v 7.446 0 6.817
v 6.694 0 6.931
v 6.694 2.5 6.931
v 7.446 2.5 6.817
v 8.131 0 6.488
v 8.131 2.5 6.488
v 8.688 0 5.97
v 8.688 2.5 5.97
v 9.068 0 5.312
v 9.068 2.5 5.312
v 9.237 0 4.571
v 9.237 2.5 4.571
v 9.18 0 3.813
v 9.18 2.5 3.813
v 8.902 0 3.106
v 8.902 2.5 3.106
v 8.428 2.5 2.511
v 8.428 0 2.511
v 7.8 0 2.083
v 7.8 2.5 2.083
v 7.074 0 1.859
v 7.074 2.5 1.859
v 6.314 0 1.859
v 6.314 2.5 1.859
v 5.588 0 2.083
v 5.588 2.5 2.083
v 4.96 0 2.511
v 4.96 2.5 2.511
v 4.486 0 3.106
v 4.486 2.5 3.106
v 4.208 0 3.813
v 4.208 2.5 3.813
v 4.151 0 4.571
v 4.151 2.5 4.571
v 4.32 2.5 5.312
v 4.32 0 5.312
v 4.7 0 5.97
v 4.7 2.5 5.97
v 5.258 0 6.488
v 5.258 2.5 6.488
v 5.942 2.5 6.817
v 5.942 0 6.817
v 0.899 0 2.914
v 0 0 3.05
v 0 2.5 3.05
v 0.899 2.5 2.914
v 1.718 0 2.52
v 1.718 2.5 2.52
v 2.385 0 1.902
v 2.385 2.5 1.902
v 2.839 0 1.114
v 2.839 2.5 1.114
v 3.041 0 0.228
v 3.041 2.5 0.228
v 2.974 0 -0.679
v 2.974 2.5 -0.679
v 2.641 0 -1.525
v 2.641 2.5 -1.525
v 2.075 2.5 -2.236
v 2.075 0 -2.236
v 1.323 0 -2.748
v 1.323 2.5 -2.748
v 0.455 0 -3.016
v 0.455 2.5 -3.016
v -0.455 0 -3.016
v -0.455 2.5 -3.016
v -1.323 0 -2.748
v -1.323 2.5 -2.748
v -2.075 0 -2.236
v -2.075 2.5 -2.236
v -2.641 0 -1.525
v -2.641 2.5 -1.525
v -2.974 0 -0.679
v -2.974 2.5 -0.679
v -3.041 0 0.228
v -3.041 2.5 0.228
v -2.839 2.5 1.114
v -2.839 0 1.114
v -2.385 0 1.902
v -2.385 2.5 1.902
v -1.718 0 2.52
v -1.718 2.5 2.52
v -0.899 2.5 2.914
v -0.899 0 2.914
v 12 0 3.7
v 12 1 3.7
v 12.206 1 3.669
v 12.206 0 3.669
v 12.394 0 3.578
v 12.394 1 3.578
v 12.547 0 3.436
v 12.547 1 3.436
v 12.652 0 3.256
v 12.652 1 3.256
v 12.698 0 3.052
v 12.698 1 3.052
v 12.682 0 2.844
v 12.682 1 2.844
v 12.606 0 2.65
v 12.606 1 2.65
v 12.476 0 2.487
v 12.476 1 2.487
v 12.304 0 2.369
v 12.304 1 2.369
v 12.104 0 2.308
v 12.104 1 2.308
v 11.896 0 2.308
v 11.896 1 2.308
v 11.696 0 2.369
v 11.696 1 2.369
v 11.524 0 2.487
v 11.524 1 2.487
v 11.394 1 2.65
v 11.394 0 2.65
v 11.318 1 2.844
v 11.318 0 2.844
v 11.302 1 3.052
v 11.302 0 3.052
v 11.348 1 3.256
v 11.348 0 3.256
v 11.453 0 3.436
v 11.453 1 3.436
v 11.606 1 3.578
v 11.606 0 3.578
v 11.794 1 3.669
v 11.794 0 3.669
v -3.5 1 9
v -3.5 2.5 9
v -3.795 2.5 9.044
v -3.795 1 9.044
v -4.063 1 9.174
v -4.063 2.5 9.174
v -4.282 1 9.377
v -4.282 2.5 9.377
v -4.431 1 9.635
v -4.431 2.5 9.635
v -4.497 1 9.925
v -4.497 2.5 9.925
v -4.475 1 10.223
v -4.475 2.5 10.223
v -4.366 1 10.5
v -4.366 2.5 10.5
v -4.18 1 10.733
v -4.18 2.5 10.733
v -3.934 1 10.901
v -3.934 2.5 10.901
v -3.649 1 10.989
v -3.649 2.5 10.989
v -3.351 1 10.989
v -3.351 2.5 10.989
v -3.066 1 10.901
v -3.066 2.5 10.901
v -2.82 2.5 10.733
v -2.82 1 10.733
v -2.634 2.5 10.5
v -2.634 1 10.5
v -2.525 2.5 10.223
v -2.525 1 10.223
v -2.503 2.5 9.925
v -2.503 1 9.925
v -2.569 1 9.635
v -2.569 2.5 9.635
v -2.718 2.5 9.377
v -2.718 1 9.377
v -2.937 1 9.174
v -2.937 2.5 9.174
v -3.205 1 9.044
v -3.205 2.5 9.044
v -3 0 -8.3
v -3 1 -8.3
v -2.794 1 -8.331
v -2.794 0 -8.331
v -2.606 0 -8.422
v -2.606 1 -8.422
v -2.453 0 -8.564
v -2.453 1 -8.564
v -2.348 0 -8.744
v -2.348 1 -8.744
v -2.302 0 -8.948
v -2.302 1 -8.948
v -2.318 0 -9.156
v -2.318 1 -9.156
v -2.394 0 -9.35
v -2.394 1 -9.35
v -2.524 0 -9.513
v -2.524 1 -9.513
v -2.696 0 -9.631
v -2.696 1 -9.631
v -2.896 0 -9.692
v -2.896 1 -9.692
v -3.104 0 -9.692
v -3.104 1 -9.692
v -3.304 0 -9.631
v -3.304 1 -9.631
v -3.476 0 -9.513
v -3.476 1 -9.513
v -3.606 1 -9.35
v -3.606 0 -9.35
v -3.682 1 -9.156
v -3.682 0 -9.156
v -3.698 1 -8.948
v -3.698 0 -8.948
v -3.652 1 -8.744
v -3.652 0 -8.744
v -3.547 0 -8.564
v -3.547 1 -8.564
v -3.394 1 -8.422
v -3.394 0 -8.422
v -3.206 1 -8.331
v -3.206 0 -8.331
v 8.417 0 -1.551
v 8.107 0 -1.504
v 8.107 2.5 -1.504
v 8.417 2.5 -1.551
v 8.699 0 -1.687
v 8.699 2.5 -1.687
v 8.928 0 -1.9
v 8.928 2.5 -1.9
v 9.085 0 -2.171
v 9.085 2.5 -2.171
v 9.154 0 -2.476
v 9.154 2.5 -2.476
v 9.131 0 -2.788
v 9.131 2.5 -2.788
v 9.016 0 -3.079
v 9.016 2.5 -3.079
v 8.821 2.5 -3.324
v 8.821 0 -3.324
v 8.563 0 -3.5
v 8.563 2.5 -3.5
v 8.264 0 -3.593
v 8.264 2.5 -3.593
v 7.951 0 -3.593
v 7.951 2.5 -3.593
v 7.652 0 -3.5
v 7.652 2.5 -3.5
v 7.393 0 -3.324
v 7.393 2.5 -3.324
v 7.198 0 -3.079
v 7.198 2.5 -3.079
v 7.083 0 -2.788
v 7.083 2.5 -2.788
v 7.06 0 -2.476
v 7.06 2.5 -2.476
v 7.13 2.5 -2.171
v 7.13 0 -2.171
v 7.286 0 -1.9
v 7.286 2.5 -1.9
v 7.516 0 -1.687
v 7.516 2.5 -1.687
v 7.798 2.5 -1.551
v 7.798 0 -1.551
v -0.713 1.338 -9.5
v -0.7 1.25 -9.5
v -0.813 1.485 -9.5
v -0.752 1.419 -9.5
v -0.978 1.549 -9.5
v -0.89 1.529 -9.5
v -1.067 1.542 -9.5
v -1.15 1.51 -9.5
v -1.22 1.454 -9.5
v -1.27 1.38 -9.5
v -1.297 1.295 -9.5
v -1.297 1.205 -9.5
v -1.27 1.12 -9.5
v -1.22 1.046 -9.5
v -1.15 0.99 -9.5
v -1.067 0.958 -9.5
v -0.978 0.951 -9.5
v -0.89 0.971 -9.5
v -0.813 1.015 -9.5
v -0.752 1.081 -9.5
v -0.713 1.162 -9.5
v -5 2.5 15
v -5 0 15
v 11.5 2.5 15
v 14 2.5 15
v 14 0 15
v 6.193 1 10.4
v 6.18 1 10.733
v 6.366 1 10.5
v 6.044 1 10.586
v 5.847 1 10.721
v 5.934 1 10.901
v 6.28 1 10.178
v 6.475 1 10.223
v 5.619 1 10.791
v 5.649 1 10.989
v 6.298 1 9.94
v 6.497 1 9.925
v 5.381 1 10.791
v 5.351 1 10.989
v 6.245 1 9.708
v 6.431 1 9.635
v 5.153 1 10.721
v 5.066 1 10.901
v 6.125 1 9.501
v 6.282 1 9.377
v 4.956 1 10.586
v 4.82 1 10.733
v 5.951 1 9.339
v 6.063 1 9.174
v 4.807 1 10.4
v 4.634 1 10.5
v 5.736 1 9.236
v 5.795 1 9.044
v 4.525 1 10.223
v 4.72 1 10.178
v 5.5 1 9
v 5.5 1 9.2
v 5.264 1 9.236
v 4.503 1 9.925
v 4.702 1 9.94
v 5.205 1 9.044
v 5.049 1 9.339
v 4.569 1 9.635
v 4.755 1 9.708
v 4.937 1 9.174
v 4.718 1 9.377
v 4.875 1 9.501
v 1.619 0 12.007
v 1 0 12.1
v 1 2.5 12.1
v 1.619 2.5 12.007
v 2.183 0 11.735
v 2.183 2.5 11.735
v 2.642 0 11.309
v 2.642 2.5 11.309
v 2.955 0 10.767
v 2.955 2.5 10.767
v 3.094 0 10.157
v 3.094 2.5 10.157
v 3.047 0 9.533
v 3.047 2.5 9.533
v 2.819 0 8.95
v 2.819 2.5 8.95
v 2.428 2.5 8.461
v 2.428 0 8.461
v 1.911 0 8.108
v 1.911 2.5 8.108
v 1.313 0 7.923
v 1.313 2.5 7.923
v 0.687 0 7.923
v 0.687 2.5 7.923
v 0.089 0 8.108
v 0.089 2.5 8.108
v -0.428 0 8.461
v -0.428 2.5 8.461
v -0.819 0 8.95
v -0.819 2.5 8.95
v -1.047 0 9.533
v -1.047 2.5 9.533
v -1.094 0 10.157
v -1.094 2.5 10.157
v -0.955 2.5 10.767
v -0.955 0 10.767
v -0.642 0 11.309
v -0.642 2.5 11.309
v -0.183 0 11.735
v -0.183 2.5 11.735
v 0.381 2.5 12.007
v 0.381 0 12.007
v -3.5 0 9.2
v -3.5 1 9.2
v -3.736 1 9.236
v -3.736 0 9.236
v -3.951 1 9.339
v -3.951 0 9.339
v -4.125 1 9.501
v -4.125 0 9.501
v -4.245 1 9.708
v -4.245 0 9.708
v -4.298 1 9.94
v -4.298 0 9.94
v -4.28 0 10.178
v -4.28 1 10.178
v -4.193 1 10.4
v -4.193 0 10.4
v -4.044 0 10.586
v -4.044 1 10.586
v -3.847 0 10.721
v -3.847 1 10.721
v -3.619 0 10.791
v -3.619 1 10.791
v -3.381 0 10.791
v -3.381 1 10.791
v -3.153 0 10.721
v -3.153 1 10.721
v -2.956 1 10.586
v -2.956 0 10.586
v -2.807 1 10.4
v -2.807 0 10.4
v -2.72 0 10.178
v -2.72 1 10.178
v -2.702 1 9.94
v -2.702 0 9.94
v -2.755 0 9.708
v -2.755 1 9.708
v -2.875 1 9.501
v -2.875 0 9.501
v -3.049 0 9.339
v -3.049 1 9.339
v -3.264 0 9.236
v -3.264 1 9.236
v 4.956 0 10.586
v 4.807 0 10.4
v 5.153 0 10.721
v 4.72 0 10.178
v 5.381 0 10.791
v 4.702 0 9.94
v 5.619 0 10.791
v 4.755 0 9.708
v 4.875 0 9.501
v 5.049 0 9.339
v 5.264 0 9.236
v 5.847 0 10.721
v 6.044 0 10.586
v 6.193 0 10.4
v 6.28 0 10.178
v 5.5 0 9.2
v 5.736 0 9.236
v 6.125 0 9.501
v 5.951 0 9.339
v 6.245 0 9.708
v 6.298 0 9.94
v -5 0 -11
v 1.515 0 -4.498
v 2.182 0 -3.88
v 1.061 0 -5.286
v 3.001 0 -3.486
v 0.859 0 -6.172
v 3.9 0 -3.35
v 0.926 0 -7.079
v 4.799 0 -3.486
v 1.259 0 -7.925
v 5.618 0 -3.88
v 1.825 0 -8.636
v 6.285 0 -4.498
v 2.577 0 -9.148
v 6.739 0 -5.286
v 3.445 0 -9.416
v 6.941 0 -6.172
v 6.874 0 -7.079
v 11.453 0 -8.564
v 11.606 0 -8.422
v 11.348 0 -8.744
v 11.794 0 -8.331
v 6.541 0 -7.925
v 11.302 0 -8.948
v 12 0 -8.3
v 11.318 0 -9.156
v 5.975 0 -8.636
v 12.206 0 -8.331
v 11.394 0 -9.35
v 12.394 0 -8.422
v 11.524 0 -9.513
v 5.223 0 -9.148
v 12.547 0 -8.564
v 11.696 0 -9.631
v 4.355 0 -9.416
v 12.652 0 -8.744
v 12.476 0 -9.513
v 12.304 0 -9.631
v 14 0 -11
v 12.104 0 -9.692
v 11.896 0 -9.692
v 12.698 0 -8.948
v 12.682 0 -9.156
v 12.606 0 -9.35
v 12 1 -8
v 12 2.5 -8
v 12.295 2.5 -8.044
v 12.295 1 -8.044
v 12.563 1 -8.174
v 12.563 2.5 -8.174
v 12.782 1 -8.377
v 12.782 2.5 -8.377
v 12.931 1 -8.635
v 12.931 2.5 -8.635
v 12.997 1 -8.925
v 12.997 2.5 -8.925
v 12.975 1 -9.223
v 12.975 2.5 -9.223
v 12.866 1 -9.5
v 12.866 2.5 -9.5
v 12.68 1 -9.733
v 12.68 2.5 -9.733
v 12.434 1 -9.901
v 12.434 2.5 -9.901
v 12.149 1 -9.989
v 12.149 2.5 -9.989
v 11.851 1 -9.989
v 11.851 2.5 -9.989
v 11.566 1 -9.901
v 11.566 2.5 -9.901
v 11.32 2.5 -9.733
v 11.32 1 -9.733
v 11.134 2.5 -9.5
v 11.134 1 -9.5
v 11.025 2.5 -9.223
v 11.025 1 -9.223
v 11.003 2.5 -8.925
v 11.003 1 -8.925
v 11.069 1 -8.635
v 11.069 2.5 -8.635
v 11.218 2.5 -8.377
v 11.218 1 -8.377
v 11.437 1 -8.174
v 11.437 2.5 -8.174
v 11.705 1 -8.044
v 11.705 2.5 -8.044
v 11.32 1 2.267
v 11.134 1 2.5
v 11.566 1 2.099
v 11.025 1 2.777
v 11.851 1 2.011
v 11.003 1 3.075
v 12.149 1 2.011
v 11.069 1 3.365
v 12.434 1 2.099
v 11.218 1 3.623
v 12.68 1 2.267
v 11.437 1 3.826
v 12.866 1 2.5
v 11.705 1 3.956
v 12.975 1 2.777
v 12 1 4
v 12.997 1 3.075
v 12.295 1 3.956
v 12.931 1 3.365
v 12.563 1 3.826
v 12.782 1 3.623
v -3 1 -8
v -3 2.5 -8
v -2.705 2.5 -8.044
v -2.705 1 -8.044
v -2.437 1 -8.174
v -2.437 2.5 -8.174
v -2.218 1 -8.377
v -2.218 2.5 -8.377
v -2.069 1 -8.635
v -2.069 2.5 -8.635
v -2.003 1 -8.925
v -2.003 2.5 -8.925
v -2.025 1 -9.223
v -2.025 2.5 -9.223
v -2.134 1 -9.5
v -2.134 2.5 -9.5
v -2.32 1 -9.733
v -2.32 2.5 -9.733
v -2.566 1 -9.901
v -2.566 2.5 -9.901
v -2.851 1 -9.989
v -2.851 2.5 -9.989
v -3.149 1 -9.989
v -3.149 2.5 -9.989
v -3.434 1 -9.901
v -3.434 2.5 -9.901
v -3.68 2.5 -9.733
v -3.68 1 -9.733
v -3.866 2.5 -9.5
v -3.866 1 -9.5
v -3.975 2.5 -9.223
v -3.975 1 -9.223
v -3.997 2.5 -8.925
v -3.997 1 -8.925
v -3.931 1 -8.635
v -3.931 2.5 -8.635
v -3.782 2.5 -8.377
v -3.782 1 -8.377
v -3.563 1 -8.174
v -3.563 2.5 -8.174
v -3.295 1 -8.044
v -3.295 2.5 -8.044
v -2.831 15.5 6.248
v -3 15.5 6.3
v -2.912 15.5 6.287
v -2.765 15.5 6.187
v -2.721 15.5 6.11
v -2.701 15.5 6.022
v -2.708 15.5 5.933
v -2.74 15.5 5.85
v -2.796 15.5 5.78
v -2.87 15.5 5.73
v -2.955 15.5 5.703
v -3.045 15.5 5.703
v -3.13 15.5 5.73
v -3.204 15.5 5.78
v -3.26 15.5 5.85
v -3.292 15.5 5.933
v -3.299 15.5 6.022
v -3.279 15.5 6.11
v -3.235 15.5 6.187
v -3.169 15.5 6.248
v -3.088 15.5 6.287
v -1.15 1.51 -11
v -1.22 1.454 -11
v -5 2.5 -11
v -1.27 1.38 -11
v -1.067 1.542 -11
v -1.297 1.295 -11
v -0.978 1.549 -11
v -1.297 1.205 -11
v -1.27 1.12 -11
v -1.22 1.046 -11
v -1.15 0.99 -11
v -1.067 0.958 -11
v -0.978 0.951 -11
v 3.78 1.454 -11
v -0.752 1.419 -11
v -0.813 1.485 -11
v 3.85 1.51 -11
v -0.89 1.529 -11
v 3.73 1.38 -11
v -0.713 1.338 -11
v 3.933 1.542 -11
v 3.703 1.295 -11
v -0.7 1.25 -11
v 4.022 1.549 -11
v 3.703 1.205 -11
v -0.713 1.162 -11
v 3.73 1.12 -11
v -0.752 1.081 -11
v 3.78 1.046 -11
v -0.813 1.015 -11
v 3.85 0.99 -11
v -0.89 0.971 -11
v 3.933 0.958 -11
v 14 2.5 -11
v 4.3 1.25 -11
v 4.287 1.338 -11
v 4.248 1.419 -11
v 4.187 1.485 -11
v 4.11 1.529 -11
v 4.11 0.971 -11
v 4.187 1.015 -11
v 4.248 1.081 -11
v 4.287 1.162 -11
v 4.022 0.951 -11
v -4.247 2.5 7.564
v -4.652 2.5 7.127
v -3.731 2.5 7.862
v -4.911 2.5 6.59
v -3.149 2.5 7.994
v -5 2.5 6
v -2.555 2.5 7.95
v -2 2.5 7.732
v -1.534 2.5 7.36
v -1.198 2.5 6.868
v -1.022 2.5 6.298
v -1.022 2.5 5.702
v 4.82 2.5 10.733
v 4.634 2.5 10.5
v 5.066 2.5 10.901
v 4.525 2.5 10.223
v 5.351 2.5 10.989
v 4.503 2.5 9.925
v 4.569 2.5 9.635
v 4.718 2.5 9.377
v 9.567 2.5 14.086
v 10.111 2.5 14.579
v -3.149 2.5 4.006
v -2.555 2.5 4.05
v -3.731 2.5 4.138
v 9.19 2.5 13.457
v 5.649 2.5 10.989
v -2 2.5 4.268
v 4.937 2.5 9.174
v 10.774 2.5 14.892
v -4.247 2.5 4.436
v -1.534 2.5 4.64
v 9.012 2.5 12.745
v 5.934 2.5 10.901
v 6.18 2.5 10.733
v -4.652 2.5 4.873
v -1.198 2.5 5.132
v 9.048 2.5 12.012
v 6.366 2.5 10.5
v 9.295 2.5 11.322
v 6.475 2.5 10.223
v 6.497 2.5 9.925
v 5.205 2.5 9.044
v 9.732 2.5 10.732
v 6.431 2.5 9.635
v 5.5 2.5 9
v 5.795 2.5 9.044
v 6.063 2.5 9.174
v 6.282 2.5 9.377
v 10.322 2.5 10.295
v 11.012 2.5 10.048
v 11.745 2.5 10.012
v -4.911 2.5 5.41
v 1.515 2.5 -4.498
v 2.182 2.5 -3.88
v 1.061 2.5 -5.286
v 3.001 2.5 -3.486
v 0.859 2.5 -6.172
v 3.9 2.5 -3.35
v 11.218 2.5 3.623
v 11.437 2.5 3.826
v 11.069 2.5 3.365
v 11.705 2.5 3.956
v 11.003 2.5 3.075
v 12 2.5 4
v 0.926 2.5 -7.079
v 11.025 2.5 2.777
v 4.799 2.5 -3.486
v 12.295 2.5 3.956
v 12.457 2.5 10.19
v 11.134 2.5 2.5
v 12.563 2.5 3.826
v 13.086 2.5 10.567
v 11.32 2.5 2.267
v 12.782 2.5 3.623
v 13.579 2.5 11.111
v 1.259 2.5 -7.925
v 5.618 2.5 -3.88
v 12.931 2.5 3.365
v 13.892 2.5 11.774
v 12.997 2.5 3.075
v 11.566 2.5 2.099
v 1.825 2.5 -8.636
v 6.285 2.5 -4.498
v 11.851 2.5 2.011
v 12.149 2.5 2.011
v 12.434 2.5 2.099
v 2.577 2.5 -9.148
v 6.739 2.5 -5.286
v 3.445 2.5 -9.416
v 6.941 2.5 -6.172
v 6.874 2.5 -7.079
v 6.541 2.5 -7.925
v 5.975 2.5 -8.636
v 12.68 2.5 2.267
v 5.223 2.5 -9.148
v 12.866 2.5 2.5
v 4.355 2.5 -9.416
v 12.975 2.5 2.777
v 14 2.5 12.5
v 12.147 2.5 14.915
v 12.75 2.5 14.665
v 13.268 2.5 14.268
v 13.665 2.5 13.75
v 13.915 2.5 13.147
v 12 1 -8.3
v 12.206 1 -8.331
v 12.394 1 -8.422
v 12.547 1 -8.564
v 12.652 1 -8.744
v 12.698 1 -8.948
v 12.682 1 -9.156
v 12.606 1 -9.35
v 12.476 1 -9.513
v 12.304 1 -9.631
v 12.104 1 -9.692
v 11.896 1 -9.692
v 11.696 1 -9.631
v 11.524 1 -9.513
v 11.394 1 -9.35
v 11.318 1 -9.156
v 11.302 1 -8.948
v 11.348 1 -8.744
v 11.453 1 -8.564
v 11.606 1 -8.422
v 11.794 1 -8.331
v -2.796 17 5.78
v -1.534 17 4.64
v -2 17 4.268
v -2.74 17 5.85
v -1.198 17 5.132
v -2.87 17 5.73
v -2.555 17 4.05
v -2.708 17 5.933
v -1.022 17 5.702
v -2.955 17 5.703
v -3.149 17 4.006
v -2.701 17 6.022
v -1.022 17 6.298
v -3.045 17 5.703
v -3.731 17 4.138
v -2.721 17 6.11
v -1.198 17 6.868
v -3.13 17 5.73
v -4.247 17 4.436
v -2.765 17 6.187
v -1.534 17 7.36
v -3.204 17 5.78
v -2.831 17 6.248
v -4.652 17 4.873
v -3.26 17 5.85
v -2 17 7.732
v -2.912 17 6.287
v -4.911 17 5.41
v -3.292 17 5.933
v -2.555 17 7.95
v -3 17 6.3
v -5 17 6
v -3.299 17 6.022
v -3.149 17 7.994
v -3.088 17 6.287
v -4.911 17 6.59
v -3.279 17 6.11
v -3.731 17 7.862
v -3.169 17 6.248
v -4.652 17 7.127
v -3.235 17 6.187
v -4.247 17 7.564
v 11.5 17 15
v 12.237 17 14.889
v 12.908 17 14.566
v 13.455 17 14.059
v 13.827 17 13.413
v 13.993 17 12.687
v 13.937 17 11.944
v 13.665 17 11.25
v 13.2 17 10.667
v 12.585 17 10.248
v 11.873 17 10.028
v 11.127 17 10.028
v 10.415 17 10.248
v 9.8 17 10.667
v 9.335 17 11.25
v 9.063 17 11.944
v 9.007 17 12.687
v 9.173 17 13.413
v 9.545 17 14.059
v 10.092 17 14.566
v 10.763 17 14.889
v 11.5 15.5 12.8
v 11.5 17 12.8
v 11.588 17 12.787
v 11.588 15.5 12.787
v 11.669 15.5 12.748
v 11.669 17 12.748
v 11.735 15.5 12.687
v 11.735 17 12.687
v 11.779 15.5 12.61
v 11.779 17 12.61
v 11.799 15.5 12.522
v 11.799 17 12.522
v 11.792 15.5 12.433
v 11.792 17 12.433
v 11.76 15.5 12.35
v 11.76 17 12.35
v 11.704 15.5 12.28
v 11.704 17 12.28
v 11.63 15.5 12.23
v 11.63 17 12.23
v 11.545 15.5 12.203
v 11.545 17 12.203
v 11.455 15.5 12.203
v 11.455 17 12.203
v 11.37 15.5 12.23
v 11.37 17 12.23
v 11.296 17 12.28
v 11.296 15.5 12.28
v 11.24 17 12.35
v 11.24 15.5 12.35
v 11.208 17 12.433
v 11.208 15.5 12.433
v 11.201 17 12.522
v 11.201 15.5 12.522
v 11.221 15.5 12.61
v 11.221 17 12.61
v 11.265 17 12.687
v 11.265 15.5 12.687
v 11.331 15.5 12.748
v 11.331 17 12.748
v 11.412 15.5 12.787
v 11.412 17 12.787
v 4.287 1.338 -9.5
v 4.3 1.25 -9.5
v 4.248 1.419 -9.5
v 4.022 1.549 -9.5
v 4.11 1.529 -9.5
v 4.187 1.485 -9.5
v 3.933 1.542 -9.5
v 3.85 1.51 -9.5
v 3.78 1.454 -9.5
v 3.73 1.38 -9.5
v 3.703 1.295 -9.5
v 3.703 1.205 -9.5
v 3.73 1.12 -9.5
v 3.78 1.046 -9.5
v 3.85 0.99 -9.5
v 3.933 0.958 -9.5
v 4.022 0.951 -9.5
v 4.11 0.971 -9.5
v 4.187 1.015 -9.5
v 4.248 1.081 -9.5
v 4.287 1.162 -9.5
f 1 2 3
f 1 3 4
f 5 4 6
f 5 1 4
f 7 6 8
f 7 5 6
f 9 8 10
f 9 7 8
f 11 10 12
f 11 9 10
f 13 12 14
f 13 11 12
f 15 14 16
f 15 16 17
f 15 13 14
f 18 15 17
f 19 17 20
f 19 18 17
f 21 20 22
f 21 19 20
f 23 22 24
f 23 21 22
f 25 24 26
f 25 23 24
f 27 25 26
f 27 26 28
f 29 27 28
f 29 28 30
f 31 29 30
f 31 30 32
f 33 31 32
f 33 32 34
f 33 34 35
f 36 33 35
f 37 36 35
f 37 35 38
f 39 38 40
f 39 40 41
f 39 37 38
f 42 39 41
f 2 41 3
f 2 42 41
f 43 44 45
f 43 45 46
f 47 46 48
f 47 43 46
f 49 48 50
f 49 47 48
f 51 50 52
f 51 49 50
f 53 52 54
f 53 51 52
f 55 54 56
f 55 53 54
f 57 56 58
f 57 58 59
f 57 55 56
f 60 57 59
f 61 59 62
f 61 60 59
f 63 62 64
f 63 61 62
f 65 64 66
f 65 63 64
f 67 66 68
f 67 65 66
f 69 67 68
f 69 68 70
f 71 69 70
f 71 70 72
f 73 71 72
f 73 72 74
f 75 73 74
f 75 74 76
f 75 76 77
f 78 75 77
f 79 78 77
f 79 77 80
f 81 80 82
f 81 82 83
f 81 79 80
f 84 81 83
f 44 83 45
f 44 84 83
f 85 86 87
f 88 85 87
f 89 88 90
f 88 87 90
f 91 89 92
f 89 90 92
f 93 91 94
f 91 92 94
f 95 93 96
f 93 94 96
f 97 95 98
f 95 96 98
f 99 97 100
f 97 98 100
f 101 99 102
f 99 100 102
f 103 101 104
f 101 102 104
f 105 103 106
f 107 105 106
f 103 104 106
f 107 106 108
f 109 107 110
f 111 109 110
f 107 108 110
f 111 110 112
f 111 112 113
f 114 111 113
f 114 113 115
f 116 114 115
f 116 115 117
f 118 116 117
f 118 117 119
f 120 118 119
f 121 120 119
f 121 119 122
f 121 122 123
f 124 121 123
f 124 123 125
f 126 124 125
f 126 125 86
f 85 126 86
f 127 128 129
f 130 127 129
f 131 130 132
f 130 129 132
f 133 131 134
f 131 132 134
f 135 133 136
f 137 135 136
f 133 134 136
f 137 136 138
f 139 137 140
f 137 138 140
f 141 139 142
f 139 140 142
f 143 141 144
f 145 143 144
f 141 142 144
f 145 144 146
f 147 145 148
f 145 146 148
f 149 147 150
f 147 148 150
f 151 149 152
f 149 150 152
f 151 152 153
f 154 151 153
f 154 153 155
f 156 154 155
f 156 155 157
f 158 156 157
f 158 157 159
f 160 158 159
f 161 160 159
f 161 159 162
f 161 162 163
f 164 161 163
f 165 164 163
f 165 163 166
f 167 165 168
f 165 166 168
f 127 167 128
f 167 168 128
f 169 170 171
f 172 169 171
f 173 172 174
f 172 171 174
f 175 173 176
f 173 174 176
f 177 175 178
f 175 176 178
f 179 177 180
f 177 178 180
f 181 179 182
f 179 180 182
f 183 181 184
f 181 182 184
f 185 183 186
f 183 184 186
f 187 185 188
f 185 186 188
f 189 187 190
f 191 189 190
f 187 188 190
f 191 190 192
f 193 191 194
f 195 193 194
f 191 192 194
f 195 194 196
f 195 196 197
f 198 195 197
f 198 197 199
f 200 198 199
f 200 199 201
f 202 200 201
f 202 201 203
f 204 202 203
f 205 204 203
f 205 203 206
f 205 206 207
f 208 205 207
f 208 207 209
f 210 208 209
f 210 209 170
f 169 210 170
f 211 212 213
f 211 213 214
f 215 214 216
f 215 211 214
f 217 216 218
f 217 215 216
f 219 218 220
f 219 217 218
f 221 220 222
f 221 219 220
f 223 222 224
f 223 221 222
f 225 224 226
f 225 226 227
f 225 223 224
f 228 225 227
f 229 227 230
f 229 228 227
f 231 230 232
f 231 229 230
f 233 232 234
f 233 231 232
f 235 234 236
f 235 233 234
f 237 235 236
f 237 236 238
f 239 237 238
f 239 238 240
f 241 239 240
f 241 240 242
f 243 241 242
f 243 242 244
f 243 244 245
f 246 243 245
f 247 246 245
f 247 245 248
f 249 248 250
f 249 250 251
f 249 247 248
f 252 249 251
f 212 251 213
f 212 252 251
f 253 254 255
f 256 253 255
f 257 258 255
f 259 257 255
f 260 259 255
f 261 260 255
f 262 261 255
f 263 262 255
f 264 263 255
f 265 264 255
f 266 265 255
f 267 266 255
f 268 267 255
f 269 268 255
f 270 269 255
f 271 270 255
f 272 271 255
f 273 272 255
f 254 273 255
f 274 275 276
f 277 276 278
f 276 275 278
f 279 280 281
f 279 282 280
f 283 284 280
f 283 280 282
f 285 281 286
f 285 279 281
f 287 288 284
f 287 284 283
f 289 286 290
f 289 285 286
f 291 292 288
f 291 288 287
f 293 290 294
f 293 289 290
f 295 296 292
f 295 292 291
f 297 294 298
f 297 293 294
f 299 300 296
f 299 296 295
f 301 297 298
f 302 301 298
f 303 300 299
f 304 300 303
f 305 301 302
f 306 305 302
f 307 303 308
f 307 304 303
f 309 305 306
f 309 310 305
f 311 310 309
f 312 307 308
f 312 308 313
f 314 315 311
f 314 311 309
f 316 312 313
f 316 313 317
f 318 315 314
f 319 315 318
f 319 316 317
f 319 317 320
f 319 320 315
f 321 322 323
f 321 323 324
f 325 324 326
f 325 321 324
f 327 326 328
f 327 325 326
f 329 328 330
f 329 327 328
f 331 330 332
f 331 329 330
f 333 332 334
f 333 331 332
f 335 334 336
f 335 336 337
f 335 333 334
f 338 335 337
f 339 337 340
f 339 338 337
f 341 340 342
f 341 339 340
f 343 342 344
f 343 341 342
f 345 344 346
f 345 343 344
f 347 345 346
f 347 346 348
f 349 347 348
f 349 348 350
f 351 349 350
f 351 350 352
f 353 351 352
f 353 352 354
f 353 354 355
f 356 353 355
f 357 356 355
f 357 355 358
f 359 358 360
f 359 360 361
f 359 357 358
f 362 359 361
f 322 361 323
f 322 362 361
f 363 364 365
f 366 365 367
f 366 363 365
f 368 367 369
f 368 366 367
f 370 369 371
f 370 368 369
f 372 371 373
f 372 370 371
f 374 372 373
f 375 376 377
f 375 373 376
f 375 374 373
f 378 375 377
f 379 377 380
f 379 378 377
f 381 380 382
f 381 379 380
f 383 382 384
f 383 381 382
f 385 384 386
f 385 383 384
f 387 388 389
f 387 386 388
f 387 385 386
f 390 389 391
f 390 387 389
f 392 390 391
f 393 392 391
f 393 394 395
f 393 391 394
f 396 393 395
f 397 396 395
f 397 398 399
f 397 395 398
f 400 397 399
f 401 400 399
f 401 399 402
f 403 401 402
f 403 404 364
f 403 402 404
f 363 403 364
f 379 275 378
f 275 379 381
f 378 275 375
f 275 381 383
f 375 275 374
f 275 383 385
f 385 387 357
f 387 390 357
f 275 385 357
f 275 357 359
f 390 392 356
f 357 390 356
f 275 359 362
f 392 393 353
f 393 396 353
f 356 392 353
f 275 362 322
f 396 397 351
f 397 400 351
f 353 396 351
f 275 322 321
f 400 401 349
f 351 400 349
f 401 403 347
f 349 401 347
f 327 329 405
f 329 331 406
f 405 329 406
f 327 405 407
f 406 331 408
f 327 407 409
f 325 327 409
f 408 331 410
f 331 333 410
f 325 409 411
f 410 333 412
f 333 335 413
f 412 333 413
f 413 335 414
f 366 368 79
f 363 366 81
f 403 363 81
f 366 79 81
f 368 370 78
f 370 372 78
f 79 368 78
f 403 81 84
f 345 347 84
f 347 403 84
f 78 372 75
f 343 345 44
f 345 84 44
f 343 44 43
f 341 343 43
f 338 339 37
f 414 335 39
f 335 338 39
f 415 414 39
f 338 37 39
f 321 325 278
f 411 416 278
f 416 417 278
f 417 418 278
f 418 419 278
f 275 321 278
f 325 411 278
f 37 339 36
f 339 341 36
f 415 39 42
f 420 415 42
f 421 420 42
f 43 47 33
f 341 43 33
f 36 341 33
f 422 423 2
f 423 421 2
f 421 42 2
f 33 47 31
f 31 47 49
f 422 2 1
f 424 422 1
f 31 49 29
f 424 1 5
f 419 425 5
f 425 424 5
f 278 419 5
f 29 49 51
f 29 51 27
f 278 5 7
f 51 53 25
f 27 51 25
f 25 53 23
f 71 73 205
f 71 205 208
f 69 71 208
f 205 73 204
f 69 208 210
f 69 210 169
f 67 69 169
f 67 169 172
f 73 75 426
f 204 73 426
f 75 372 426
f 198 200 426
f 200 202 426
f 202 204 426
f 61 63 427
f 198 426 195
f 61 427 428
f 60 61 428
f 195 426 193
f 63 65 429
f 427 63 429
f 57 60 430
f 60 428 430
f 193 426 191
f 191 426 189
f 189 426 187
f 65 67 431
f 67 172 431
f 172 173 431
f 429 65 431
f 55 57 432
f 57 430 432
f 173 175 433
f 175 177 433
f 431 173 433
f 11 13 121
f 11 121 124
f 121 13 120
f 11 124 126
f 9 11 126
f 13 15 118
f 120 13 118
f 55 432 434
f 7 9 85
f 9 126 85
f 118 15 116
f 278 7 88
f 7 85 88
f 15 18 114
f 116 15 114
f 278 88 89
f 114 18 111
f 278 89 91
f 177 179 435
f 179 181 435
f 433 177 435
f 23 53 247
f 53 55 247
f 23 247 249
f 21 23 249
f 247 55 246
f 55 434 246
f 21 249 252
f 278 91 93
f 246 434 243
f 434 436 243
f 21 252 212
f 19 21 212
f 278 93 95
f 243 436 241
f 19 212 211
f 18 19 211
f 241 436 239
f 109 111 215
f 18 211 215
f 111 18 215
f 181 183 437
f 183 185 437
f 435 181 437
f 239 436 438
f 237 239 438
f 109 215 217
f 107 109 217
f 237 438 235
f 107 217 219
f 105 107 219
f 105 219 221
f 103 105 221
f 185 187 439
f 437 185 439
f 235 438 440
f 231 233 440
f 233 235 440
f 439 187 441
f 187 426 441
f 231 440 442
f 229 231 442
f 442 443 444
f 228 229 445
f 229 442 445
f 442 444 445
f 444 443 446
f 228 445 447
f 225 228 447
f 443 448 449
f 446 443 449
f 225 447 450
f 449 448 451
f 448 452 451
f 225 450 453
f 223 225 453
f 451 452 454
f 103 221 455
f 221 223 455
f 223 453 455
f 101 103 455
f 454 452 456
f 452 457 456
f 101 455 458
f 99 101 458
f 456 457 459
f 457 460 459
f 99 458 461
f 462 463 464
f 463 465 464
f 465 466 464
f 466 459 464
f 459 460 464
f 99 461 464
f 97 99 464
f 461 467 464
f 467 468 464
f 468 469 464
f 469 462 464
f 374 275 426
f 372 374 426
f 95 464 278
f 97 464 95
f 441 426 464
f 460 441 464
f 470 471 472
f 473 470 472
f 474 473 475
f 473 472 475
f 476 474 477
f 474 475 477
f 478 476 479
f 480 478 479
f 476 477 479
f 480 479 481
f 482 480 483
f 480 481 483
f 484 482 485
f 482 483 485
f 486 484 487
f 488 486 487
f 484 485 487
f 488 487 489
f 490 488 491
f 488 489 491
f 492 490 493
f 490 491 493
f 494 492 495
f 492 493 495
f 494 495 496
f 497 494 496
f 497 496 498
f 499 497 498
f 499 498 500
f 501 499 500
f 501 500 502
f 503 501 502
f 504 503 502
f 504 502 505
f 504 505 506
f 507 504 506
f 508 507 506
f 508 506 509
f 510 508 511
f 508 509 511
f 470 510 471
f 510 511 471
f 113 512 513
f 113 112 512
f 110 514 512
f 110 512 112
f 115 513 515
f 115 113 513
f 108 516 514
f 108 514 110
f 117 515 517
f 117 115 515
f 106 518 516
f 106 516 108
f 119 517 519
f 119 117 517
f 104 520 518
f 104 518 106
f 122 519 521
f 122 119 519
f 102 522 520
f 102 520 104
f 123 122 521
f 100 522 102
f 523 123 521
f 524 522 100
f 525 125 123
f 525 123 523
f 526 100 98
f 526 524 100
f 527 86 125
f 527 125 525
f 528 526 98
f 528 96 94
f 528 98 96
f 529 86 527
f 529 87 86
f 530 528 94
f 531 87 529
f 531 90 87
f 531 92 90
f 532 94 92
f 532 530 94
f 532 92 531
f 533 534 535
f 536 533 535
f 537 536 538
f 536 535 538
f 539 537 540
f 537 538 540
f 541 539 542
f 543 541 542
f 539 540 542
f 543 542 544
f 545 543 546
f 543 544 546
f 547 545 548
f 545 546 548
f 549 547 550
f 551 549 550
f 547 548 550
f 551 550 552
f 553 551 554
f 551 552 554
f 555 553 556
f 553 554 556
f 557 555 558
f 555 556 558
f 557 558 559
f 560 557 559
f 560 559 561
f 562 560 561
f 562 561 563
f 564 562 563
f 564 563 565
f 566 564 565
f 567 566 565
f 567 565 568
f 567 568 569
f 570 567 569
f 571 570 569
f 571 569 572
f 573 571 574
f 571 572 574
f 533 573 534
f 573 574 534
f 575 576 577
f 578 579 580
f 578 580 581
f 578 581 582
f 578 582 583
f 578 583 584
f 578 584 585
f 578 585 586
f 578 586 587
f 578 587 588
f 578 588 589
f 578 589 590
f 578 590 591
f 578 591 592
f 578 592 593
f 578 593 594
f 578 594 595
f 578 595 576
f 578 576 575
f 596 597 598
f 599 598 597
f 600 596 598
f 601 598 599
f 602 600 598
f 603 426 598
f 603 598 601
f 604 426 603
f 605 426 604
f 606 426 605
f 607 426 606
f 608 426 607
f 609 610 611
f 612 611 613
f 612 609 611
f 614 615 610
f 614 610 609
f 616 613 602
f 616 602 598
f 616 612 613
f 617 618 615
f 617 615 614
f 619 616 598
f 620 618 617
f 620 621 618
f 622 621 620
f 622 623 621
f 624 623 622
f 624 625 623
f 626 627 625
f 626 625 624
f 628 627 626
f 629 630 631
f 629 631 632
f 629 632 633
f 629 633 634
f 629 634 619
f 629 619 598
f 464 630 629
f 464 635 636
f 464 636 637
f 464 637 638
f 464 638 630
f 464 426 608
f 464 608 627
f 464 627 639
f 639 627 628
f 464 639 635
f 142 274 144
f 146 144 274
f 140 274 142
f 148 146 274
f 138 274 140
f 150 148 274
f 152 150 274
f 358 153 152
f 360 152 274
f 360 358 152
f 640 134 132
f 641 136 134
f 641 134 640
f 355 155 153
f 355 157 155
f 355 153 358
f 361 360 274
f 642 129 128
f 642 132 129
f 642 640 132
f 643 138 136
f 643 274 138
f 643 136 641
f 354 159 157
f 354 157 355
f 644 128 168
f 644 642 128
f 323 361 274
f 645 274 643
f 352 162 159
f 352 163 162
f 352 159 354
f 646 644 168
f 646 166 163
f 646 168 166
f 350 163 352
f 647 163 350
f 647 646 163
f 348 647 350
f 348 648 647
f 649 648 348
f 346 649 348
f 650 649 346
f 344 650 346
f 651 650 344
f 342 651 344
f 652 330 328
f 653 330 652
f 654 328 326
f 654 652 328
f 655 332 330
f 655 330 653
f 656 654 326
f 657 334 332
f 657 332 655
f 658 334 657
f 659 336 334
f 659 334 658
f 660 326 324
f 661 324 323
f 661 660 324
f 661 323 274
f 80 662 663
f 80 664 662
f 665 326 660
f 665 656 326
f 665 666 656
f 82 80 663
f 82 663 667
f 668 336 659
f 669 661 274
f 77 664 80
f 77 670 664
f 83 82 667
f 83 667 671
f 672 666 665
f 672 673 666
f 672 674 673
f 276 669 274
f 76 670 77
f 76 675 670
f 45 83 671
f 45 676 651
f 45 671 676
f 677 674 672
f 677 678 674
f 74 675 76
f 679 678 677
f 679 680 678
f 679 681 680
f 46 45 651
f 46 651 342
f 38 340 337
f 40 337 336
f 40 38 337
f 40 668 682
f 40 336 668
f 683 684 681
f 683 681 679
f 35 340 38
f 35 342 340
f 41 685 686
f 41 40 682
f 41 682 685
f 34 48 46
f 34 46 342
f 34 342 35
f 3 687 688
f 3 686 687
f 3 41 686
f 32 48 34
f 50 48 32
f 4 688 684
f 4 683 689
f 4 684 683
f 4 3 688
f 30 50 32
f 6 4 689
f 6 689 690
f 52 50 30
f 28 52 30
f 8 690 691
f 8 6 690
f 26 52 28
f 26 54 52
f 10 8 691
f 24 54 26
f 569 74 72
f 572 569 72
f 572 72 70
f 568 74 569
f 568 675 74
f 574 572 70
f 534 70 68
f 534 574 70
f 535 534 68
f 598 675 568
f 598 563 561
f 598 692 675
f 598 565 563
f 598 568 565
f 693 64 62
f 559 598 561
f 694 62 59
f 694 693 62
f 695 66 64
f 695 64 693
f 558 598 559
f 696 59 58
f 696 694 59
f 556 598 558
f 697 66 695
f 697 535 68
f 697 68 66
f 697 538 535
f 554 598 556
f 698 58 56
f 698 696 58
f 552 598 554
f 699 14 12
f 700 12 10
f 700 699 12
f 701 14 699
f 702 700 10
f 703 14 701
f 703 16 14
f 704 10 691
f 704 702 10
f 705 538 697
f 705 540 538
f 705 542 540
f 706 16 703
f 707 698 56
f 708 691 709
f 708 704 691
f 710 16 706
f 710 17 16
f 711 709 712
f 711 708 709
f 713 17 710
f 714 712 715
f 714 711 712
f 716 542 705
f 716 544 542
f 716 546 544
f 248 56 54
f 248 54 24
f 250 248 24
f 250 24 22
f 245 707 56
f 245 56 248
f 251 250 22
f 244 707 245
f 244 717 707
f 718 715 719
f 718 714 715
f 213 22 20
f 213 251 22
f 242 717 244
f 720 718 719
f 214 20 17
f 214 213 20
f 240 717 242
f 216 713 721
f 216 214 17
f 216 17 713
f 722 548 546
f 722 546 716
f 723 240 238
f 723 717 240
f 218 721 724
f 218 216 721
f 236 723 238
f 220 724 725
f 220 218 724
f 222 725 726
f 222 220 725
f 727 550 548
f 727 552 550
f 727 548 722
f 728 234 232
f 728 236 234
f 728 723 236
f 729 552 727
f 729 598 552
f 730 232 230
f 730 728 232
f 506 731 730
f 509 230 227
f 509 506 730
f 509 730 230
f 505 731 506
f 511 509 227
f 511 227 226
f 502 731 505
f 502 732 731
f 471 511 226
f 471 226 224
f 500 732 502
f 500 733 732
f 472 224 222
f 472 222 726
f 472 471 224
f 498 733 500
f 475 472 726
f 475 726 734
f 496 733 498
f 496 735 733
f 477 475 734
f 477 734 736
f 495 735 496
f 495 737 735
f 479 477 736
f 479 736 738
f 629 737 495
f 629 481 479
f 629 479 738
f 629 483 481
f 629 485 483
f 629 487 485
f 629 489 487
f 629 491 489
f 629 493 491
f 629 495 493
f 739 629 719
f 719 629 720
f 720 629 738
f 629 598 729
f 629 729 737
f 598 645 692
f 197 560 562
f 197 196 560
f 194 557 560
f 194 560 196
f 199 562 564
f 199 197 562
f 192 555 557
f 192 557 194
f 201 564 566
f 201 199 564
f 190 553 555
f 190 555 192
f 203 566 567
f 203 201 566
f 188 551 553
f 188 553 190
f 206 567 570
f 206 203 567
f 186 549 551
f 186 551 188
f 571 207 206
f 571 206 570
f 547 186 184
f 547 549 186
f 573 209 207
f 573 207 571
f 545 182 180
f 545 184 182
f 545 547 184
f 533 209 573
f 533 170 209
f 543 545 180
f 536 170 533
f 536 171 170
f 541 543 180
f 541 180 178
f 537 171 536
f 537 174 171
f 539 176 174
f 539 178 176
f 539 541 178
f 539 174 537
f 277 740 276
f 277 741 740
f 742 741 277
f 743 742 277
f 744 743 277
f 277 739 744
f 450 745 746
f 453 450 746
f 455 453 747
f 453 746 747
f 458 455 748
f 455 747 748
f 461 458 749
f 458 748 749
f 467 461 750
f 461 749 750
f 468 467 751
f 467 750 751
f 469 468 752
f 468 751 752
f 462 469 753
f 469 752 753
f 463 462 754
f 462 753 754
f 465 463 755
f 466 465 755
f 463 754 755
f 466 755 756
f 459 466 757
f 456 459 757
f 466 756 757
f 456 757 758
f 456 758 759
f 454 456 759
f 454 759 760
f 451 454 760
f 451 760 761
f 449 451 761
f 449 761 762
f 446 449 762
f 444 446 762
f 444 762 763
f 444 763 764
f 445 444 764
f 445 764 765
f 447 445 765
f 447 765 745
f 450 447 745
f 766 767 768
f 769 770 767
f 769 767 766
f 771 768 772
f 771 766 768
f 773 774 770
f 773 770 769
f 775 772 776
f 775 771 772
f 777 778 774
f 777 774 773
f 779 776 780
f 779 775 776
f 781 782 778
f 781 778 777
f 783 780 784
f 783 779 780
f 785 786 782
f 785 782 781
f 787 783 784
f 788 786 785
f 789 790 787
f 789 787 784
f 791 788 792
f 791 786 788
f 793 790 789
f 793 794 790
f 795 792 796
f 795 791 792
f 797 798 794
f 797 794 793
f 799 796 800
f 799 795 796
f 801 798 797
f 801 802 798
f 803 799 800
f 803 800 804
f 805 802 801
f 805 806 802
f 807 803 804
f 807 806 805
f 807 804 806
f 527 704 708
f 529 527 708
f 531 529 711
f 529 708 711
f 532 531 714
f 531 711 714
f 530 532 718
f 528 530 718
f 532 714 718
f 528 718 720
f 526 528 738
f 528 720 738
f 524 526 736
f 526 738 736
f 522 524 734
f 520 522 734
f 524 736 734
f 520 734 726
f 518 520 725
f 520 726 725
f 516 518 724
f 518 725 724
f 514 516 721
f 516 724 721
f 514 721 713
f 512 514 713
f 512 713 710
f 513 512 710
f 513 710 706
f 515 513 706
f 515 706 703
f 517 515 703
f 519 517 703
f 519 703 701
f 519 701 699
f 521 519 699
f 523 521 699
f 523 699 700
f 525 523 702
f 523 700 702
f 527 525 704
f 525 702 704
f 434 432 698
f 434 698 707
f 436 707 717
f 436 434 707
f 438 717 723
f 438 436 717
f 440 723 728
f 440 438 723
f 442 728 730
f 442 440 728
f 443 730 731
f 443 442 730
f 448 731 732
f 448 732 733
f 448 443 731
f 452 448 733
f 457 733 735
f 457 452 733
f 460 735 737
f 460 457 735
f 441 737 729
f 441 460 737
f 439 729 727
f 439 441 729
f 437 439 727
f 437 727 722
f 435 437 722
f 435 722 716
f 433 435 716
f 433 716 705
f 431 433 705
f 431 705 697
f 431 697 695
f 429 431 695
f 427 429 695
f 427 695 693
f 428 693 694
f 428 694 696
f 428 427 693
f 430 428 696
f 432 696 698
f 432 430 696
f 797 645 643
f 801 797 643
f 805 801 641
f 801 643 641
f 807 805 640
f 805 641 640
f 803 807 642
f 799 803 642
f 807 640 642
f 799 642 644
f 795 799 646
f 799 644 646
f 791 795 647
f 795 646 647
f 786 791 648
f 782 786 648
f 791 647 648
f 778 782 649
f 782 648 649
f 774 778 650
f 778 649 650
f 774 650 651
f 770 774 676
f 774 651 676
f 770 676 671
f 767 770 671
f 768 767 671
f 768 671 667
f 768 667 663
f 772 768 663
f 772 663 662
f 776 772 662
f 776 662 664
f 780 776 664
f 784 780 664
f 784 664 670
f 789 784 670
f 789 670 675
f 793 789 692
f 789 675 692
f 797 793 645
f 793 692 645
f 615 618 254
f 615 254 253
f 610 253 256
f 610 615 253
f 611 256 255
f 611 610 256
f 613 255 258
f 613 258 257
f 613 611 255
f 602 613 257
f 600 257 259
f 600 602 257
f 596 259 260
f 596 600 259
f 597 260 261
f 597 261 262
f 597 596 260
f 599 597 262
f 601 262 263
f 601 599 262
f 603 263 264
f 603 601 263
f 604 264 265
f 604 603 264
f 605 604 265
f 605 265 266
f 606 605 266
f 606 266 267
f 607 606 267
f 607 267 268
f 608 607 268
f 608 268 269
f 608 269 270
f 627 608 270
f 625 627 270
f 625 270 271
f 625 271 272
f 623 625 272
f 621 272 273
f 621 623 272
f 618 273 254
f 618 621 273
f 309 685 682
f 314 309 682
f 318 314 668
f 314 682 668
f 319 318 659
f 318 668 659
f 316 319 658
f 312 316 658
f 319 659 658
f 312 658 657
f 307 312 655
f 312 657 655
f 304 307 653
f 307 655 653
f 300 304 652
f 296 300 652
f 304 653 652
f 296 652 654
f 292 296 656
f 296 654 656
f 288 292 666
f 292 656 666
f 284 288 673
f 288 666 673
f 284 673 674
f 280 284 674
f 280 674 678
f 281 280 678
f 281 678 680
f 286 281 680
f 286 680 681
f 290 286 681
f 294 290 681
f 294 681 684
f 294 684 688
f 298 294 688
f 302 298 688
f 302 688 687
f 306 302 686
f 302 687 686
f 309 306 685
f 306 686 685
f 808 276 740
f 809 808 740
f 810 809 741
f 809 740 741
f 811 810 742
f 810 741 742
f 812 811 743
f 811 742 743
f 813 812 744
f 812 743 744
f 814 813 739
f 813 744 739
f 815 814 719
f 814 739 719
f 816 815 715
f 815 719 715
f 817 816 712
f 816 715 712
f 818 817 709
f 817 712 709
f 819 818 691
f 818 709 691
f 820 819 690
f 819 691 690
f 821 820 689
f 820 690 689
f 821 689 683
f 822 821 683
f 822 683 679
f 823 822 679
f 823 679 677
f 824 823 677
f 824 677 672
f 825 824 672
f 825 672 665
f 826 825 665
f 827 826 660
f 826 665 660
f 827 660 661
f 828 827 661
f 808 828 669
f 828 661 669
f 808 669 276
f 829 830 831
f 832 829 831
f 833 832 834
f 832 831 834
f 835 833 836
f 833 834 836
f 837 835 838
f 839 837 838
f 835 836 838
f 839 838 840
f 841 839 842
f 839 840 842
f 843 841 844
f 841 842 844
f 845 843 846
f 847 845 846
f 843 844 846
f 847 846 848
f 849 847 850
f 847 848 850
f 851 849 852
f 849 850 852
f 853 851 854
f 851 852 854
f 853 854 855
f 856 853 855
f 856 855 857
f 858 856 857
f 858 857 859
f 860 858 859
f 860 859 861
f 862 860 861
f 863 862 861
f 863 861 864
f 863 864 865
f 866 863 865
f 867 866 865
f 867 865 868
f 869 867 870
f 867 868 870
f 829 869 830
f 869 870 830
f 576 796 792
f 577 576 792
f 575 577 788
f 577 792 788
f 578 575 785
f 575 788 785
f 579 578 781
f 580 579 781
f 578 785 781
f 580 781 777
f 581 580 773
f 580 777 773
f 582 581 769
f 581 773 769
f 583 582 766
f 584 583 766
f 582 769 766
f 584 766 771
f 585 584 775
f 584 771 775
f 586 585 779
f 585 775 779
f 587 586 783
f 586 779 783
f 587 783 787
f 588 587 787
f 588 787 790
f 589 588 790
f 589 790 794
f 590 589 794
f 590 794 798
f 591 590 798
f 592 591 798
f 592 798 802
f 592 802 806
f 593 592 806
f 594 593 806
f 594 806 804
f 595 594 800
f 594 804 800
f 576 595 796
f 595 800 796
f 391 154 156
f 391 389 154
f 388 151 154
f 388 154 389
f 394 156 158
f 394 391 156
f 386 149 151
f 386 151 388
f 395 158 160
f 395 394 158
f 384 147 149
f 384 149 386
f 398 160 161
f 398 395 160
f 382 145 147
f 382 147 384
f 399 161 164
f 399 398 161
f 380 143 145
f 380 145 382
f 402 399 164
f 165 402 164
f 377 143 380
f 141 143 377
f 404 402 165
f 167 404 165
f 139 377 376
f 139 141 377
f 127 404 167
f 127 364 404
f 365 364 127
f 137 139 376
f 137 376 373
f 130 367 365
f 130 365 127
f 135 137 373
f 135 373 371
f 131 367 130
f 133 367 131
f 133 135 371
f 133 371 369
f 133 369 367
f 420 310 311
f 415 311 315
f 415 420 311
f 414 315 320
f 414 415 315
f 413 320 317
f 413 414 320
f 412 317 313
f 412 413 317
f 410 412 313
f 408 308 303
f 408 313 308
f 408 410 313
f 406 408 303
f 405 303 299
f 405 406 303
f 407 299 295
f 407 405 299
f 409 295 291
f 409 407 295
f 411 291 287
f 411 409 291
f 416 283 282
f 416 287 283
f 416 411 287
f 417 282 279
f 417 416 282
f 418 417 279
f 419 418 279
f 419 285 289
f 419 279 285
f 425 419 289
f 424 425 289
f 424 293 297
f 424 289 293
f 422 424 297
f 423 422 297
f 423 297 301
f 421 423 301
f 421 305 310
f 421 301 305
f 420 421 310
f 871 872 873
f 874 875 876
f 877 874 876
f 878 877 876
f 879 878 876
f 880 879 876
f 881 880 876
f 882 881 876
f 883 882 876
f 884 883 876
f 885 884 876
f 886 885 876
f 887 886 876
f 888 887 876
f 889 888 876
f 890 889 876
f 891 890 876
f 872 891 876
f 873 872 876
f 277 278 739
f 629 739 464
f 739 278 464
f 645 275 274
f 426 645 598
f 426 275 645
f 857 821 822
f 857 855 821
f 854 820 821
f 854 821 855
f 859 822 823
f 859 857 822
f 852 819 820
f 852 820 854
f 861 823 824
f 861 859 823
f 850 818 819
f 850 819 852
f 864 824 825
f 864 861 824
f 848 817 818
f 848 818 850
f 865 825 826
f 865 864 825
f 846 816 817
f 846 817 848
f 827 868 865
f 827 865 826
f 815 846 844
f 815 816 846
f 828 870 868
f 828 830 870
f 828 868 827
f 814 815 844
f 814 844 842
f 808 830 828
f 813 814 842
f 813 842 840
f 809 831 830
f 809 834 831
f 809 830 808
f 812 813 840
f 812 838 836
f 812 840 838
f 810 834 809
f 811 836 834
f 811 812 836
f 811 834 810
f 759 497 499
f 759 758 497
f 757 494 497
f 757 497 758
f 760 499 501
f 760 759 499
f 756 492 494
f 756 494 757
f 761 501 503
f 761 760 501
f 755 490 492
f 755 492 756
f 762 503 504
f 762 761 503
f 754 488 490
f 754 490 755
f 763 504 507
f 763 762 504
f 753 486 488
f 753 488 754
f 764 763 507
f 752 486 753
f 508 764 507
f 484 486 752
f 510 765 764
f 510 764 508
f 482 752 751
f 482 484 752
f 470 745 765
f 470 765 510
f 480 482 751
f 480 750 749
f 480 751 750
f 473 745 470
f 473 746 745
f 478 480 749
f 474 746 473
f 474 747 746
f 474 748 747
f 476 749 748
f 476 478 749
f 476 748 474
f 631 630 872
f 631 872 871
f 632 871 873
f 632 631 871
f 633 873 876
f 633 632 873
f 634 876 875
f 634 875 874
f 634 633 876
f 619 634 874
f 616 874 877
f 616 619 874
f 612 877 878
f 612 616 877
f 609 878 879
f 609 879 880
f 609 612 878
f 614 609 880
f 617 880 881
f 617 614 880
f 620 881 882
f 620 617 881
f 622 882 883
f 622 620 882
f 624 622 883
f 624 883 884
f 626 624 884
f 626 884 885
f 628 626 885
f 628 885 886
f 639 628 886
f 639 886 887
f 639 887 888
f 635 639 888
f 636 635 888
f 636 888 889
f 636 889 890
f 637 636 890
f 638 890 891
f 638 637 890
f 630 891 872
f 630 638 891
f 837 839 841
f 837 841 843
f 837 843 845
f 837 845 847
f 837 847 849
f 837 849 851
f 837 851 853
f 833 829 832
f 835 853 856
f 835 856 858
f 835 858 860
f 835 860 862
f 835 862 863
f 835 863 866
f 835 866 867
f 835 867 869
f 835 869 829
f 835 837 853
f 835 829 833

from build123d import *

# Parameters (mm, degrees)
SKETCH_1_W          = 19
SKETCH_1_H          = 26
SKETCH_1_R          = 3.05
SKETCH_1_R_2        = 1.05
SKETCH_1_R_3        = 2.1
SKETCH_1_R_4        = 2.55
EXTRUDE_1_DEPTH     = 2.5
CUT_EXTRUDE_START   = 2.5
SKETCH_1_3_R        = 1
CUT_EXTRUDE_2_DEPTH = 1.5
SKETCH_1_4_R        = 0.8
CUT_EXTRUDE_3_DEPTH = 1.5
SKETCH_2_R          = 2.5
SKETCH_2_R_2        = 2
EXTRUDE_2_DEPTH     = 14.5
CUT_EXTRUDE_START_2 = 14.5
SKETCH_2_4_R        = 0.3
CUT_EXTRUDE_6_DEPTH = 1.5
SKETCH_4_R          = 1
CUT_EXTRUDE_7_DEPTH = 1.5
SKETCH_4_3_R        = 0.7
CUT_EXTRUDE_8_DEPTH = 26.124689053
SKETCH_3_R          = 0.3
CUT_EXTRUDE_9_DEPTH = 1.5


with BuildPart() as part:
    # 草图1 → 凸台-拉伸1 (new body)
    with BuildSketch(Plane(origin=(0, 0, 0), x_dir=(1, 0, 0), z_dir=(0, 1, 0))):
        with Locations((4.5, -2)):
            Rectangle(SKETCH_1_W, SKETCH_1_H)
        with Locations(Location((0, 0, 0), (0, 0, 270))):
            Circle(SKETCH_1_R, mode=Mode.SUBTRACT)
        with Locations(Location((8.107149516, 2.554237014, 0), (0, 0, 270))):
            Circle(SKETCH_1_R_2, mode=Mode.SUBTRACT)
        with Locations(Location((3.9, 6.4, 0), (0, 0, 270))):
            Circle(SKETCH_1_R, mode=Mode.SUBTRACT)
        with Locations(Location((1, -10, 0), (0, 0, 270))):
            Circle(SKETCH_1_R_3, mode=Mode.SUBTRACT)
        with Locations(Location((6.694056557, -4.380594344, 0), (0, 0, 270))):
            Circle(SKETCH_1_R_4, mode=Mode.SUBTRACT)
    extrude(amount=EXTRUDE_1_DEPTH)

    # 草图1<3> → 切除-拉伸2 (cut)
    with BuildSketch(Plane(origin=(0, 0, 0), x_dir=(1, 0, 0), z_dir=(0, 1, 0)).offset(CUT_EXTRUDE_START)):
        with Locations(Location((-3.5, -10, 0), (0, 0, 90))):
            Circle(SKETCH_1_3_R)
        with Locations(Location((5.5, -10, 0), (0, 0, 90))):
            Circle(SKETCH_1_3_R)
    extrude(amount=-CUT_EXTRUDE_2_DEPTH, mode=Mode.SUBTRACT)

    # 草图1<4> → 切除-拉伸3 (cut)
    with BuildSketch(Plane(origin=(0, 0, 0), x_dir=(1, 0, 0), z_dir=(0, 1, 0))):
        with Locations(Location((-3.5, -10, 0), (0, 0, 90))):
            Circle(SKETCH_1_4_R)
        with Locations(Location((5.5, -10, 0), (0, 0, 90))):
            Circle(SKETCH_1_4_R)
    extrude(amount=CUT_EXTRUDE_3_DEPTH, mode=Mode.SUBTRACT)

    # 草图2 → 凸台-拉伸2 (add)
    with BuildSketch(Plane(origin=(0, 2.5, 0), x_dir=(1, 0, 0), z_dir=(0, 1, 0))):
        with Locations(Location((11.5, -12.5, 0), (0, 0, 270))):
            Circle(SKETCH_2_R)
        with Locations(Location((-3, -6, 0), (0, 0, 180))):
            Circle(SKETCH_2_R_2)
    extrude(amount=EXTRUDE_2_DEPTH)

    # 草图2<4> → 切除-拉伸6 (cut)
    with BuildSketch(Plane(origin=(0, 2.5, 0), x_dir=(1, 0, 0), z_dir=(0, 1, 0)).offset(CUT_EXTRUDE_START_2)):
        with Locations(Location((11.5, -12.5, 0), (0, 0, 270))):
            Circle(SKETCH_2_4_R)
        with Locations(Location((-3, -6, 0), (0, 0, 270))):
            Circle(SKETCH_2_4_R)
    extrude(amount=-CUT_EXTRUDE_6_DEPTH, mode=Mode.SUBTRACT)

    # 草图4 → 切除-拉伸7 (cut)
    with BuildSketch(Plane(origin=(0, 2.5, 0), x_dir=(1, 0, 0), z_dir=(0, 1, 0))):
        with Locations(Location((12, 9, 0), (0, 0, 270))):
            Circle(SKETCH_4_R)
        with Locations(Location((-3, 9, 0), (0, 0, 270))):
            Circle(SKETCH_4_R)
        with Locations(Location((12, -3, 0), (0, 0, 270))):
            Circle(SKETCH_4_R)
    extrude(amount=-CUT_EXTRUDE_7_DEPTH, mode=Mode.SUBTRACT)

    # 草图4<3> → 切除-拉伸8 (cut, through all)
    with BuildSketch(Plane(origin=(0, 2.5, 0), x_dir=(1, 0, 0), z_dir=(0, 1, 0))):
        with Locations(Location((12, 9, 0), (0, 0, 270))):
            Circle(SKETCH_4_3_R)
        with Locations(Location((-3, 9, 0), (0, 0, 270))):
            Circle(SKETCH_4_3_R)
        with Locations(Location((12, -3, 0), (0, 0, 270))):
            Circle(SKETCH_4_3_R)
    extrude(amount=-CUT_EXTRUDE_8_DEPTH, mode=Mode.SUBTRACT)

    # 草图3 → 切除-拉伸9 (cut)
    with BuildSketch(Plane.XY.offset(-11)):
        with Locations((-1, 1.25)):
            Circle(SKETCH_3_R)
        with Locations((4, 1.25)):
            Circle(SKETCH_3_R)
    extrude(amount=CUT_EXTRUDE_9_DEPTH, mode=Mode.SUBTRACT)


solid = part.part
